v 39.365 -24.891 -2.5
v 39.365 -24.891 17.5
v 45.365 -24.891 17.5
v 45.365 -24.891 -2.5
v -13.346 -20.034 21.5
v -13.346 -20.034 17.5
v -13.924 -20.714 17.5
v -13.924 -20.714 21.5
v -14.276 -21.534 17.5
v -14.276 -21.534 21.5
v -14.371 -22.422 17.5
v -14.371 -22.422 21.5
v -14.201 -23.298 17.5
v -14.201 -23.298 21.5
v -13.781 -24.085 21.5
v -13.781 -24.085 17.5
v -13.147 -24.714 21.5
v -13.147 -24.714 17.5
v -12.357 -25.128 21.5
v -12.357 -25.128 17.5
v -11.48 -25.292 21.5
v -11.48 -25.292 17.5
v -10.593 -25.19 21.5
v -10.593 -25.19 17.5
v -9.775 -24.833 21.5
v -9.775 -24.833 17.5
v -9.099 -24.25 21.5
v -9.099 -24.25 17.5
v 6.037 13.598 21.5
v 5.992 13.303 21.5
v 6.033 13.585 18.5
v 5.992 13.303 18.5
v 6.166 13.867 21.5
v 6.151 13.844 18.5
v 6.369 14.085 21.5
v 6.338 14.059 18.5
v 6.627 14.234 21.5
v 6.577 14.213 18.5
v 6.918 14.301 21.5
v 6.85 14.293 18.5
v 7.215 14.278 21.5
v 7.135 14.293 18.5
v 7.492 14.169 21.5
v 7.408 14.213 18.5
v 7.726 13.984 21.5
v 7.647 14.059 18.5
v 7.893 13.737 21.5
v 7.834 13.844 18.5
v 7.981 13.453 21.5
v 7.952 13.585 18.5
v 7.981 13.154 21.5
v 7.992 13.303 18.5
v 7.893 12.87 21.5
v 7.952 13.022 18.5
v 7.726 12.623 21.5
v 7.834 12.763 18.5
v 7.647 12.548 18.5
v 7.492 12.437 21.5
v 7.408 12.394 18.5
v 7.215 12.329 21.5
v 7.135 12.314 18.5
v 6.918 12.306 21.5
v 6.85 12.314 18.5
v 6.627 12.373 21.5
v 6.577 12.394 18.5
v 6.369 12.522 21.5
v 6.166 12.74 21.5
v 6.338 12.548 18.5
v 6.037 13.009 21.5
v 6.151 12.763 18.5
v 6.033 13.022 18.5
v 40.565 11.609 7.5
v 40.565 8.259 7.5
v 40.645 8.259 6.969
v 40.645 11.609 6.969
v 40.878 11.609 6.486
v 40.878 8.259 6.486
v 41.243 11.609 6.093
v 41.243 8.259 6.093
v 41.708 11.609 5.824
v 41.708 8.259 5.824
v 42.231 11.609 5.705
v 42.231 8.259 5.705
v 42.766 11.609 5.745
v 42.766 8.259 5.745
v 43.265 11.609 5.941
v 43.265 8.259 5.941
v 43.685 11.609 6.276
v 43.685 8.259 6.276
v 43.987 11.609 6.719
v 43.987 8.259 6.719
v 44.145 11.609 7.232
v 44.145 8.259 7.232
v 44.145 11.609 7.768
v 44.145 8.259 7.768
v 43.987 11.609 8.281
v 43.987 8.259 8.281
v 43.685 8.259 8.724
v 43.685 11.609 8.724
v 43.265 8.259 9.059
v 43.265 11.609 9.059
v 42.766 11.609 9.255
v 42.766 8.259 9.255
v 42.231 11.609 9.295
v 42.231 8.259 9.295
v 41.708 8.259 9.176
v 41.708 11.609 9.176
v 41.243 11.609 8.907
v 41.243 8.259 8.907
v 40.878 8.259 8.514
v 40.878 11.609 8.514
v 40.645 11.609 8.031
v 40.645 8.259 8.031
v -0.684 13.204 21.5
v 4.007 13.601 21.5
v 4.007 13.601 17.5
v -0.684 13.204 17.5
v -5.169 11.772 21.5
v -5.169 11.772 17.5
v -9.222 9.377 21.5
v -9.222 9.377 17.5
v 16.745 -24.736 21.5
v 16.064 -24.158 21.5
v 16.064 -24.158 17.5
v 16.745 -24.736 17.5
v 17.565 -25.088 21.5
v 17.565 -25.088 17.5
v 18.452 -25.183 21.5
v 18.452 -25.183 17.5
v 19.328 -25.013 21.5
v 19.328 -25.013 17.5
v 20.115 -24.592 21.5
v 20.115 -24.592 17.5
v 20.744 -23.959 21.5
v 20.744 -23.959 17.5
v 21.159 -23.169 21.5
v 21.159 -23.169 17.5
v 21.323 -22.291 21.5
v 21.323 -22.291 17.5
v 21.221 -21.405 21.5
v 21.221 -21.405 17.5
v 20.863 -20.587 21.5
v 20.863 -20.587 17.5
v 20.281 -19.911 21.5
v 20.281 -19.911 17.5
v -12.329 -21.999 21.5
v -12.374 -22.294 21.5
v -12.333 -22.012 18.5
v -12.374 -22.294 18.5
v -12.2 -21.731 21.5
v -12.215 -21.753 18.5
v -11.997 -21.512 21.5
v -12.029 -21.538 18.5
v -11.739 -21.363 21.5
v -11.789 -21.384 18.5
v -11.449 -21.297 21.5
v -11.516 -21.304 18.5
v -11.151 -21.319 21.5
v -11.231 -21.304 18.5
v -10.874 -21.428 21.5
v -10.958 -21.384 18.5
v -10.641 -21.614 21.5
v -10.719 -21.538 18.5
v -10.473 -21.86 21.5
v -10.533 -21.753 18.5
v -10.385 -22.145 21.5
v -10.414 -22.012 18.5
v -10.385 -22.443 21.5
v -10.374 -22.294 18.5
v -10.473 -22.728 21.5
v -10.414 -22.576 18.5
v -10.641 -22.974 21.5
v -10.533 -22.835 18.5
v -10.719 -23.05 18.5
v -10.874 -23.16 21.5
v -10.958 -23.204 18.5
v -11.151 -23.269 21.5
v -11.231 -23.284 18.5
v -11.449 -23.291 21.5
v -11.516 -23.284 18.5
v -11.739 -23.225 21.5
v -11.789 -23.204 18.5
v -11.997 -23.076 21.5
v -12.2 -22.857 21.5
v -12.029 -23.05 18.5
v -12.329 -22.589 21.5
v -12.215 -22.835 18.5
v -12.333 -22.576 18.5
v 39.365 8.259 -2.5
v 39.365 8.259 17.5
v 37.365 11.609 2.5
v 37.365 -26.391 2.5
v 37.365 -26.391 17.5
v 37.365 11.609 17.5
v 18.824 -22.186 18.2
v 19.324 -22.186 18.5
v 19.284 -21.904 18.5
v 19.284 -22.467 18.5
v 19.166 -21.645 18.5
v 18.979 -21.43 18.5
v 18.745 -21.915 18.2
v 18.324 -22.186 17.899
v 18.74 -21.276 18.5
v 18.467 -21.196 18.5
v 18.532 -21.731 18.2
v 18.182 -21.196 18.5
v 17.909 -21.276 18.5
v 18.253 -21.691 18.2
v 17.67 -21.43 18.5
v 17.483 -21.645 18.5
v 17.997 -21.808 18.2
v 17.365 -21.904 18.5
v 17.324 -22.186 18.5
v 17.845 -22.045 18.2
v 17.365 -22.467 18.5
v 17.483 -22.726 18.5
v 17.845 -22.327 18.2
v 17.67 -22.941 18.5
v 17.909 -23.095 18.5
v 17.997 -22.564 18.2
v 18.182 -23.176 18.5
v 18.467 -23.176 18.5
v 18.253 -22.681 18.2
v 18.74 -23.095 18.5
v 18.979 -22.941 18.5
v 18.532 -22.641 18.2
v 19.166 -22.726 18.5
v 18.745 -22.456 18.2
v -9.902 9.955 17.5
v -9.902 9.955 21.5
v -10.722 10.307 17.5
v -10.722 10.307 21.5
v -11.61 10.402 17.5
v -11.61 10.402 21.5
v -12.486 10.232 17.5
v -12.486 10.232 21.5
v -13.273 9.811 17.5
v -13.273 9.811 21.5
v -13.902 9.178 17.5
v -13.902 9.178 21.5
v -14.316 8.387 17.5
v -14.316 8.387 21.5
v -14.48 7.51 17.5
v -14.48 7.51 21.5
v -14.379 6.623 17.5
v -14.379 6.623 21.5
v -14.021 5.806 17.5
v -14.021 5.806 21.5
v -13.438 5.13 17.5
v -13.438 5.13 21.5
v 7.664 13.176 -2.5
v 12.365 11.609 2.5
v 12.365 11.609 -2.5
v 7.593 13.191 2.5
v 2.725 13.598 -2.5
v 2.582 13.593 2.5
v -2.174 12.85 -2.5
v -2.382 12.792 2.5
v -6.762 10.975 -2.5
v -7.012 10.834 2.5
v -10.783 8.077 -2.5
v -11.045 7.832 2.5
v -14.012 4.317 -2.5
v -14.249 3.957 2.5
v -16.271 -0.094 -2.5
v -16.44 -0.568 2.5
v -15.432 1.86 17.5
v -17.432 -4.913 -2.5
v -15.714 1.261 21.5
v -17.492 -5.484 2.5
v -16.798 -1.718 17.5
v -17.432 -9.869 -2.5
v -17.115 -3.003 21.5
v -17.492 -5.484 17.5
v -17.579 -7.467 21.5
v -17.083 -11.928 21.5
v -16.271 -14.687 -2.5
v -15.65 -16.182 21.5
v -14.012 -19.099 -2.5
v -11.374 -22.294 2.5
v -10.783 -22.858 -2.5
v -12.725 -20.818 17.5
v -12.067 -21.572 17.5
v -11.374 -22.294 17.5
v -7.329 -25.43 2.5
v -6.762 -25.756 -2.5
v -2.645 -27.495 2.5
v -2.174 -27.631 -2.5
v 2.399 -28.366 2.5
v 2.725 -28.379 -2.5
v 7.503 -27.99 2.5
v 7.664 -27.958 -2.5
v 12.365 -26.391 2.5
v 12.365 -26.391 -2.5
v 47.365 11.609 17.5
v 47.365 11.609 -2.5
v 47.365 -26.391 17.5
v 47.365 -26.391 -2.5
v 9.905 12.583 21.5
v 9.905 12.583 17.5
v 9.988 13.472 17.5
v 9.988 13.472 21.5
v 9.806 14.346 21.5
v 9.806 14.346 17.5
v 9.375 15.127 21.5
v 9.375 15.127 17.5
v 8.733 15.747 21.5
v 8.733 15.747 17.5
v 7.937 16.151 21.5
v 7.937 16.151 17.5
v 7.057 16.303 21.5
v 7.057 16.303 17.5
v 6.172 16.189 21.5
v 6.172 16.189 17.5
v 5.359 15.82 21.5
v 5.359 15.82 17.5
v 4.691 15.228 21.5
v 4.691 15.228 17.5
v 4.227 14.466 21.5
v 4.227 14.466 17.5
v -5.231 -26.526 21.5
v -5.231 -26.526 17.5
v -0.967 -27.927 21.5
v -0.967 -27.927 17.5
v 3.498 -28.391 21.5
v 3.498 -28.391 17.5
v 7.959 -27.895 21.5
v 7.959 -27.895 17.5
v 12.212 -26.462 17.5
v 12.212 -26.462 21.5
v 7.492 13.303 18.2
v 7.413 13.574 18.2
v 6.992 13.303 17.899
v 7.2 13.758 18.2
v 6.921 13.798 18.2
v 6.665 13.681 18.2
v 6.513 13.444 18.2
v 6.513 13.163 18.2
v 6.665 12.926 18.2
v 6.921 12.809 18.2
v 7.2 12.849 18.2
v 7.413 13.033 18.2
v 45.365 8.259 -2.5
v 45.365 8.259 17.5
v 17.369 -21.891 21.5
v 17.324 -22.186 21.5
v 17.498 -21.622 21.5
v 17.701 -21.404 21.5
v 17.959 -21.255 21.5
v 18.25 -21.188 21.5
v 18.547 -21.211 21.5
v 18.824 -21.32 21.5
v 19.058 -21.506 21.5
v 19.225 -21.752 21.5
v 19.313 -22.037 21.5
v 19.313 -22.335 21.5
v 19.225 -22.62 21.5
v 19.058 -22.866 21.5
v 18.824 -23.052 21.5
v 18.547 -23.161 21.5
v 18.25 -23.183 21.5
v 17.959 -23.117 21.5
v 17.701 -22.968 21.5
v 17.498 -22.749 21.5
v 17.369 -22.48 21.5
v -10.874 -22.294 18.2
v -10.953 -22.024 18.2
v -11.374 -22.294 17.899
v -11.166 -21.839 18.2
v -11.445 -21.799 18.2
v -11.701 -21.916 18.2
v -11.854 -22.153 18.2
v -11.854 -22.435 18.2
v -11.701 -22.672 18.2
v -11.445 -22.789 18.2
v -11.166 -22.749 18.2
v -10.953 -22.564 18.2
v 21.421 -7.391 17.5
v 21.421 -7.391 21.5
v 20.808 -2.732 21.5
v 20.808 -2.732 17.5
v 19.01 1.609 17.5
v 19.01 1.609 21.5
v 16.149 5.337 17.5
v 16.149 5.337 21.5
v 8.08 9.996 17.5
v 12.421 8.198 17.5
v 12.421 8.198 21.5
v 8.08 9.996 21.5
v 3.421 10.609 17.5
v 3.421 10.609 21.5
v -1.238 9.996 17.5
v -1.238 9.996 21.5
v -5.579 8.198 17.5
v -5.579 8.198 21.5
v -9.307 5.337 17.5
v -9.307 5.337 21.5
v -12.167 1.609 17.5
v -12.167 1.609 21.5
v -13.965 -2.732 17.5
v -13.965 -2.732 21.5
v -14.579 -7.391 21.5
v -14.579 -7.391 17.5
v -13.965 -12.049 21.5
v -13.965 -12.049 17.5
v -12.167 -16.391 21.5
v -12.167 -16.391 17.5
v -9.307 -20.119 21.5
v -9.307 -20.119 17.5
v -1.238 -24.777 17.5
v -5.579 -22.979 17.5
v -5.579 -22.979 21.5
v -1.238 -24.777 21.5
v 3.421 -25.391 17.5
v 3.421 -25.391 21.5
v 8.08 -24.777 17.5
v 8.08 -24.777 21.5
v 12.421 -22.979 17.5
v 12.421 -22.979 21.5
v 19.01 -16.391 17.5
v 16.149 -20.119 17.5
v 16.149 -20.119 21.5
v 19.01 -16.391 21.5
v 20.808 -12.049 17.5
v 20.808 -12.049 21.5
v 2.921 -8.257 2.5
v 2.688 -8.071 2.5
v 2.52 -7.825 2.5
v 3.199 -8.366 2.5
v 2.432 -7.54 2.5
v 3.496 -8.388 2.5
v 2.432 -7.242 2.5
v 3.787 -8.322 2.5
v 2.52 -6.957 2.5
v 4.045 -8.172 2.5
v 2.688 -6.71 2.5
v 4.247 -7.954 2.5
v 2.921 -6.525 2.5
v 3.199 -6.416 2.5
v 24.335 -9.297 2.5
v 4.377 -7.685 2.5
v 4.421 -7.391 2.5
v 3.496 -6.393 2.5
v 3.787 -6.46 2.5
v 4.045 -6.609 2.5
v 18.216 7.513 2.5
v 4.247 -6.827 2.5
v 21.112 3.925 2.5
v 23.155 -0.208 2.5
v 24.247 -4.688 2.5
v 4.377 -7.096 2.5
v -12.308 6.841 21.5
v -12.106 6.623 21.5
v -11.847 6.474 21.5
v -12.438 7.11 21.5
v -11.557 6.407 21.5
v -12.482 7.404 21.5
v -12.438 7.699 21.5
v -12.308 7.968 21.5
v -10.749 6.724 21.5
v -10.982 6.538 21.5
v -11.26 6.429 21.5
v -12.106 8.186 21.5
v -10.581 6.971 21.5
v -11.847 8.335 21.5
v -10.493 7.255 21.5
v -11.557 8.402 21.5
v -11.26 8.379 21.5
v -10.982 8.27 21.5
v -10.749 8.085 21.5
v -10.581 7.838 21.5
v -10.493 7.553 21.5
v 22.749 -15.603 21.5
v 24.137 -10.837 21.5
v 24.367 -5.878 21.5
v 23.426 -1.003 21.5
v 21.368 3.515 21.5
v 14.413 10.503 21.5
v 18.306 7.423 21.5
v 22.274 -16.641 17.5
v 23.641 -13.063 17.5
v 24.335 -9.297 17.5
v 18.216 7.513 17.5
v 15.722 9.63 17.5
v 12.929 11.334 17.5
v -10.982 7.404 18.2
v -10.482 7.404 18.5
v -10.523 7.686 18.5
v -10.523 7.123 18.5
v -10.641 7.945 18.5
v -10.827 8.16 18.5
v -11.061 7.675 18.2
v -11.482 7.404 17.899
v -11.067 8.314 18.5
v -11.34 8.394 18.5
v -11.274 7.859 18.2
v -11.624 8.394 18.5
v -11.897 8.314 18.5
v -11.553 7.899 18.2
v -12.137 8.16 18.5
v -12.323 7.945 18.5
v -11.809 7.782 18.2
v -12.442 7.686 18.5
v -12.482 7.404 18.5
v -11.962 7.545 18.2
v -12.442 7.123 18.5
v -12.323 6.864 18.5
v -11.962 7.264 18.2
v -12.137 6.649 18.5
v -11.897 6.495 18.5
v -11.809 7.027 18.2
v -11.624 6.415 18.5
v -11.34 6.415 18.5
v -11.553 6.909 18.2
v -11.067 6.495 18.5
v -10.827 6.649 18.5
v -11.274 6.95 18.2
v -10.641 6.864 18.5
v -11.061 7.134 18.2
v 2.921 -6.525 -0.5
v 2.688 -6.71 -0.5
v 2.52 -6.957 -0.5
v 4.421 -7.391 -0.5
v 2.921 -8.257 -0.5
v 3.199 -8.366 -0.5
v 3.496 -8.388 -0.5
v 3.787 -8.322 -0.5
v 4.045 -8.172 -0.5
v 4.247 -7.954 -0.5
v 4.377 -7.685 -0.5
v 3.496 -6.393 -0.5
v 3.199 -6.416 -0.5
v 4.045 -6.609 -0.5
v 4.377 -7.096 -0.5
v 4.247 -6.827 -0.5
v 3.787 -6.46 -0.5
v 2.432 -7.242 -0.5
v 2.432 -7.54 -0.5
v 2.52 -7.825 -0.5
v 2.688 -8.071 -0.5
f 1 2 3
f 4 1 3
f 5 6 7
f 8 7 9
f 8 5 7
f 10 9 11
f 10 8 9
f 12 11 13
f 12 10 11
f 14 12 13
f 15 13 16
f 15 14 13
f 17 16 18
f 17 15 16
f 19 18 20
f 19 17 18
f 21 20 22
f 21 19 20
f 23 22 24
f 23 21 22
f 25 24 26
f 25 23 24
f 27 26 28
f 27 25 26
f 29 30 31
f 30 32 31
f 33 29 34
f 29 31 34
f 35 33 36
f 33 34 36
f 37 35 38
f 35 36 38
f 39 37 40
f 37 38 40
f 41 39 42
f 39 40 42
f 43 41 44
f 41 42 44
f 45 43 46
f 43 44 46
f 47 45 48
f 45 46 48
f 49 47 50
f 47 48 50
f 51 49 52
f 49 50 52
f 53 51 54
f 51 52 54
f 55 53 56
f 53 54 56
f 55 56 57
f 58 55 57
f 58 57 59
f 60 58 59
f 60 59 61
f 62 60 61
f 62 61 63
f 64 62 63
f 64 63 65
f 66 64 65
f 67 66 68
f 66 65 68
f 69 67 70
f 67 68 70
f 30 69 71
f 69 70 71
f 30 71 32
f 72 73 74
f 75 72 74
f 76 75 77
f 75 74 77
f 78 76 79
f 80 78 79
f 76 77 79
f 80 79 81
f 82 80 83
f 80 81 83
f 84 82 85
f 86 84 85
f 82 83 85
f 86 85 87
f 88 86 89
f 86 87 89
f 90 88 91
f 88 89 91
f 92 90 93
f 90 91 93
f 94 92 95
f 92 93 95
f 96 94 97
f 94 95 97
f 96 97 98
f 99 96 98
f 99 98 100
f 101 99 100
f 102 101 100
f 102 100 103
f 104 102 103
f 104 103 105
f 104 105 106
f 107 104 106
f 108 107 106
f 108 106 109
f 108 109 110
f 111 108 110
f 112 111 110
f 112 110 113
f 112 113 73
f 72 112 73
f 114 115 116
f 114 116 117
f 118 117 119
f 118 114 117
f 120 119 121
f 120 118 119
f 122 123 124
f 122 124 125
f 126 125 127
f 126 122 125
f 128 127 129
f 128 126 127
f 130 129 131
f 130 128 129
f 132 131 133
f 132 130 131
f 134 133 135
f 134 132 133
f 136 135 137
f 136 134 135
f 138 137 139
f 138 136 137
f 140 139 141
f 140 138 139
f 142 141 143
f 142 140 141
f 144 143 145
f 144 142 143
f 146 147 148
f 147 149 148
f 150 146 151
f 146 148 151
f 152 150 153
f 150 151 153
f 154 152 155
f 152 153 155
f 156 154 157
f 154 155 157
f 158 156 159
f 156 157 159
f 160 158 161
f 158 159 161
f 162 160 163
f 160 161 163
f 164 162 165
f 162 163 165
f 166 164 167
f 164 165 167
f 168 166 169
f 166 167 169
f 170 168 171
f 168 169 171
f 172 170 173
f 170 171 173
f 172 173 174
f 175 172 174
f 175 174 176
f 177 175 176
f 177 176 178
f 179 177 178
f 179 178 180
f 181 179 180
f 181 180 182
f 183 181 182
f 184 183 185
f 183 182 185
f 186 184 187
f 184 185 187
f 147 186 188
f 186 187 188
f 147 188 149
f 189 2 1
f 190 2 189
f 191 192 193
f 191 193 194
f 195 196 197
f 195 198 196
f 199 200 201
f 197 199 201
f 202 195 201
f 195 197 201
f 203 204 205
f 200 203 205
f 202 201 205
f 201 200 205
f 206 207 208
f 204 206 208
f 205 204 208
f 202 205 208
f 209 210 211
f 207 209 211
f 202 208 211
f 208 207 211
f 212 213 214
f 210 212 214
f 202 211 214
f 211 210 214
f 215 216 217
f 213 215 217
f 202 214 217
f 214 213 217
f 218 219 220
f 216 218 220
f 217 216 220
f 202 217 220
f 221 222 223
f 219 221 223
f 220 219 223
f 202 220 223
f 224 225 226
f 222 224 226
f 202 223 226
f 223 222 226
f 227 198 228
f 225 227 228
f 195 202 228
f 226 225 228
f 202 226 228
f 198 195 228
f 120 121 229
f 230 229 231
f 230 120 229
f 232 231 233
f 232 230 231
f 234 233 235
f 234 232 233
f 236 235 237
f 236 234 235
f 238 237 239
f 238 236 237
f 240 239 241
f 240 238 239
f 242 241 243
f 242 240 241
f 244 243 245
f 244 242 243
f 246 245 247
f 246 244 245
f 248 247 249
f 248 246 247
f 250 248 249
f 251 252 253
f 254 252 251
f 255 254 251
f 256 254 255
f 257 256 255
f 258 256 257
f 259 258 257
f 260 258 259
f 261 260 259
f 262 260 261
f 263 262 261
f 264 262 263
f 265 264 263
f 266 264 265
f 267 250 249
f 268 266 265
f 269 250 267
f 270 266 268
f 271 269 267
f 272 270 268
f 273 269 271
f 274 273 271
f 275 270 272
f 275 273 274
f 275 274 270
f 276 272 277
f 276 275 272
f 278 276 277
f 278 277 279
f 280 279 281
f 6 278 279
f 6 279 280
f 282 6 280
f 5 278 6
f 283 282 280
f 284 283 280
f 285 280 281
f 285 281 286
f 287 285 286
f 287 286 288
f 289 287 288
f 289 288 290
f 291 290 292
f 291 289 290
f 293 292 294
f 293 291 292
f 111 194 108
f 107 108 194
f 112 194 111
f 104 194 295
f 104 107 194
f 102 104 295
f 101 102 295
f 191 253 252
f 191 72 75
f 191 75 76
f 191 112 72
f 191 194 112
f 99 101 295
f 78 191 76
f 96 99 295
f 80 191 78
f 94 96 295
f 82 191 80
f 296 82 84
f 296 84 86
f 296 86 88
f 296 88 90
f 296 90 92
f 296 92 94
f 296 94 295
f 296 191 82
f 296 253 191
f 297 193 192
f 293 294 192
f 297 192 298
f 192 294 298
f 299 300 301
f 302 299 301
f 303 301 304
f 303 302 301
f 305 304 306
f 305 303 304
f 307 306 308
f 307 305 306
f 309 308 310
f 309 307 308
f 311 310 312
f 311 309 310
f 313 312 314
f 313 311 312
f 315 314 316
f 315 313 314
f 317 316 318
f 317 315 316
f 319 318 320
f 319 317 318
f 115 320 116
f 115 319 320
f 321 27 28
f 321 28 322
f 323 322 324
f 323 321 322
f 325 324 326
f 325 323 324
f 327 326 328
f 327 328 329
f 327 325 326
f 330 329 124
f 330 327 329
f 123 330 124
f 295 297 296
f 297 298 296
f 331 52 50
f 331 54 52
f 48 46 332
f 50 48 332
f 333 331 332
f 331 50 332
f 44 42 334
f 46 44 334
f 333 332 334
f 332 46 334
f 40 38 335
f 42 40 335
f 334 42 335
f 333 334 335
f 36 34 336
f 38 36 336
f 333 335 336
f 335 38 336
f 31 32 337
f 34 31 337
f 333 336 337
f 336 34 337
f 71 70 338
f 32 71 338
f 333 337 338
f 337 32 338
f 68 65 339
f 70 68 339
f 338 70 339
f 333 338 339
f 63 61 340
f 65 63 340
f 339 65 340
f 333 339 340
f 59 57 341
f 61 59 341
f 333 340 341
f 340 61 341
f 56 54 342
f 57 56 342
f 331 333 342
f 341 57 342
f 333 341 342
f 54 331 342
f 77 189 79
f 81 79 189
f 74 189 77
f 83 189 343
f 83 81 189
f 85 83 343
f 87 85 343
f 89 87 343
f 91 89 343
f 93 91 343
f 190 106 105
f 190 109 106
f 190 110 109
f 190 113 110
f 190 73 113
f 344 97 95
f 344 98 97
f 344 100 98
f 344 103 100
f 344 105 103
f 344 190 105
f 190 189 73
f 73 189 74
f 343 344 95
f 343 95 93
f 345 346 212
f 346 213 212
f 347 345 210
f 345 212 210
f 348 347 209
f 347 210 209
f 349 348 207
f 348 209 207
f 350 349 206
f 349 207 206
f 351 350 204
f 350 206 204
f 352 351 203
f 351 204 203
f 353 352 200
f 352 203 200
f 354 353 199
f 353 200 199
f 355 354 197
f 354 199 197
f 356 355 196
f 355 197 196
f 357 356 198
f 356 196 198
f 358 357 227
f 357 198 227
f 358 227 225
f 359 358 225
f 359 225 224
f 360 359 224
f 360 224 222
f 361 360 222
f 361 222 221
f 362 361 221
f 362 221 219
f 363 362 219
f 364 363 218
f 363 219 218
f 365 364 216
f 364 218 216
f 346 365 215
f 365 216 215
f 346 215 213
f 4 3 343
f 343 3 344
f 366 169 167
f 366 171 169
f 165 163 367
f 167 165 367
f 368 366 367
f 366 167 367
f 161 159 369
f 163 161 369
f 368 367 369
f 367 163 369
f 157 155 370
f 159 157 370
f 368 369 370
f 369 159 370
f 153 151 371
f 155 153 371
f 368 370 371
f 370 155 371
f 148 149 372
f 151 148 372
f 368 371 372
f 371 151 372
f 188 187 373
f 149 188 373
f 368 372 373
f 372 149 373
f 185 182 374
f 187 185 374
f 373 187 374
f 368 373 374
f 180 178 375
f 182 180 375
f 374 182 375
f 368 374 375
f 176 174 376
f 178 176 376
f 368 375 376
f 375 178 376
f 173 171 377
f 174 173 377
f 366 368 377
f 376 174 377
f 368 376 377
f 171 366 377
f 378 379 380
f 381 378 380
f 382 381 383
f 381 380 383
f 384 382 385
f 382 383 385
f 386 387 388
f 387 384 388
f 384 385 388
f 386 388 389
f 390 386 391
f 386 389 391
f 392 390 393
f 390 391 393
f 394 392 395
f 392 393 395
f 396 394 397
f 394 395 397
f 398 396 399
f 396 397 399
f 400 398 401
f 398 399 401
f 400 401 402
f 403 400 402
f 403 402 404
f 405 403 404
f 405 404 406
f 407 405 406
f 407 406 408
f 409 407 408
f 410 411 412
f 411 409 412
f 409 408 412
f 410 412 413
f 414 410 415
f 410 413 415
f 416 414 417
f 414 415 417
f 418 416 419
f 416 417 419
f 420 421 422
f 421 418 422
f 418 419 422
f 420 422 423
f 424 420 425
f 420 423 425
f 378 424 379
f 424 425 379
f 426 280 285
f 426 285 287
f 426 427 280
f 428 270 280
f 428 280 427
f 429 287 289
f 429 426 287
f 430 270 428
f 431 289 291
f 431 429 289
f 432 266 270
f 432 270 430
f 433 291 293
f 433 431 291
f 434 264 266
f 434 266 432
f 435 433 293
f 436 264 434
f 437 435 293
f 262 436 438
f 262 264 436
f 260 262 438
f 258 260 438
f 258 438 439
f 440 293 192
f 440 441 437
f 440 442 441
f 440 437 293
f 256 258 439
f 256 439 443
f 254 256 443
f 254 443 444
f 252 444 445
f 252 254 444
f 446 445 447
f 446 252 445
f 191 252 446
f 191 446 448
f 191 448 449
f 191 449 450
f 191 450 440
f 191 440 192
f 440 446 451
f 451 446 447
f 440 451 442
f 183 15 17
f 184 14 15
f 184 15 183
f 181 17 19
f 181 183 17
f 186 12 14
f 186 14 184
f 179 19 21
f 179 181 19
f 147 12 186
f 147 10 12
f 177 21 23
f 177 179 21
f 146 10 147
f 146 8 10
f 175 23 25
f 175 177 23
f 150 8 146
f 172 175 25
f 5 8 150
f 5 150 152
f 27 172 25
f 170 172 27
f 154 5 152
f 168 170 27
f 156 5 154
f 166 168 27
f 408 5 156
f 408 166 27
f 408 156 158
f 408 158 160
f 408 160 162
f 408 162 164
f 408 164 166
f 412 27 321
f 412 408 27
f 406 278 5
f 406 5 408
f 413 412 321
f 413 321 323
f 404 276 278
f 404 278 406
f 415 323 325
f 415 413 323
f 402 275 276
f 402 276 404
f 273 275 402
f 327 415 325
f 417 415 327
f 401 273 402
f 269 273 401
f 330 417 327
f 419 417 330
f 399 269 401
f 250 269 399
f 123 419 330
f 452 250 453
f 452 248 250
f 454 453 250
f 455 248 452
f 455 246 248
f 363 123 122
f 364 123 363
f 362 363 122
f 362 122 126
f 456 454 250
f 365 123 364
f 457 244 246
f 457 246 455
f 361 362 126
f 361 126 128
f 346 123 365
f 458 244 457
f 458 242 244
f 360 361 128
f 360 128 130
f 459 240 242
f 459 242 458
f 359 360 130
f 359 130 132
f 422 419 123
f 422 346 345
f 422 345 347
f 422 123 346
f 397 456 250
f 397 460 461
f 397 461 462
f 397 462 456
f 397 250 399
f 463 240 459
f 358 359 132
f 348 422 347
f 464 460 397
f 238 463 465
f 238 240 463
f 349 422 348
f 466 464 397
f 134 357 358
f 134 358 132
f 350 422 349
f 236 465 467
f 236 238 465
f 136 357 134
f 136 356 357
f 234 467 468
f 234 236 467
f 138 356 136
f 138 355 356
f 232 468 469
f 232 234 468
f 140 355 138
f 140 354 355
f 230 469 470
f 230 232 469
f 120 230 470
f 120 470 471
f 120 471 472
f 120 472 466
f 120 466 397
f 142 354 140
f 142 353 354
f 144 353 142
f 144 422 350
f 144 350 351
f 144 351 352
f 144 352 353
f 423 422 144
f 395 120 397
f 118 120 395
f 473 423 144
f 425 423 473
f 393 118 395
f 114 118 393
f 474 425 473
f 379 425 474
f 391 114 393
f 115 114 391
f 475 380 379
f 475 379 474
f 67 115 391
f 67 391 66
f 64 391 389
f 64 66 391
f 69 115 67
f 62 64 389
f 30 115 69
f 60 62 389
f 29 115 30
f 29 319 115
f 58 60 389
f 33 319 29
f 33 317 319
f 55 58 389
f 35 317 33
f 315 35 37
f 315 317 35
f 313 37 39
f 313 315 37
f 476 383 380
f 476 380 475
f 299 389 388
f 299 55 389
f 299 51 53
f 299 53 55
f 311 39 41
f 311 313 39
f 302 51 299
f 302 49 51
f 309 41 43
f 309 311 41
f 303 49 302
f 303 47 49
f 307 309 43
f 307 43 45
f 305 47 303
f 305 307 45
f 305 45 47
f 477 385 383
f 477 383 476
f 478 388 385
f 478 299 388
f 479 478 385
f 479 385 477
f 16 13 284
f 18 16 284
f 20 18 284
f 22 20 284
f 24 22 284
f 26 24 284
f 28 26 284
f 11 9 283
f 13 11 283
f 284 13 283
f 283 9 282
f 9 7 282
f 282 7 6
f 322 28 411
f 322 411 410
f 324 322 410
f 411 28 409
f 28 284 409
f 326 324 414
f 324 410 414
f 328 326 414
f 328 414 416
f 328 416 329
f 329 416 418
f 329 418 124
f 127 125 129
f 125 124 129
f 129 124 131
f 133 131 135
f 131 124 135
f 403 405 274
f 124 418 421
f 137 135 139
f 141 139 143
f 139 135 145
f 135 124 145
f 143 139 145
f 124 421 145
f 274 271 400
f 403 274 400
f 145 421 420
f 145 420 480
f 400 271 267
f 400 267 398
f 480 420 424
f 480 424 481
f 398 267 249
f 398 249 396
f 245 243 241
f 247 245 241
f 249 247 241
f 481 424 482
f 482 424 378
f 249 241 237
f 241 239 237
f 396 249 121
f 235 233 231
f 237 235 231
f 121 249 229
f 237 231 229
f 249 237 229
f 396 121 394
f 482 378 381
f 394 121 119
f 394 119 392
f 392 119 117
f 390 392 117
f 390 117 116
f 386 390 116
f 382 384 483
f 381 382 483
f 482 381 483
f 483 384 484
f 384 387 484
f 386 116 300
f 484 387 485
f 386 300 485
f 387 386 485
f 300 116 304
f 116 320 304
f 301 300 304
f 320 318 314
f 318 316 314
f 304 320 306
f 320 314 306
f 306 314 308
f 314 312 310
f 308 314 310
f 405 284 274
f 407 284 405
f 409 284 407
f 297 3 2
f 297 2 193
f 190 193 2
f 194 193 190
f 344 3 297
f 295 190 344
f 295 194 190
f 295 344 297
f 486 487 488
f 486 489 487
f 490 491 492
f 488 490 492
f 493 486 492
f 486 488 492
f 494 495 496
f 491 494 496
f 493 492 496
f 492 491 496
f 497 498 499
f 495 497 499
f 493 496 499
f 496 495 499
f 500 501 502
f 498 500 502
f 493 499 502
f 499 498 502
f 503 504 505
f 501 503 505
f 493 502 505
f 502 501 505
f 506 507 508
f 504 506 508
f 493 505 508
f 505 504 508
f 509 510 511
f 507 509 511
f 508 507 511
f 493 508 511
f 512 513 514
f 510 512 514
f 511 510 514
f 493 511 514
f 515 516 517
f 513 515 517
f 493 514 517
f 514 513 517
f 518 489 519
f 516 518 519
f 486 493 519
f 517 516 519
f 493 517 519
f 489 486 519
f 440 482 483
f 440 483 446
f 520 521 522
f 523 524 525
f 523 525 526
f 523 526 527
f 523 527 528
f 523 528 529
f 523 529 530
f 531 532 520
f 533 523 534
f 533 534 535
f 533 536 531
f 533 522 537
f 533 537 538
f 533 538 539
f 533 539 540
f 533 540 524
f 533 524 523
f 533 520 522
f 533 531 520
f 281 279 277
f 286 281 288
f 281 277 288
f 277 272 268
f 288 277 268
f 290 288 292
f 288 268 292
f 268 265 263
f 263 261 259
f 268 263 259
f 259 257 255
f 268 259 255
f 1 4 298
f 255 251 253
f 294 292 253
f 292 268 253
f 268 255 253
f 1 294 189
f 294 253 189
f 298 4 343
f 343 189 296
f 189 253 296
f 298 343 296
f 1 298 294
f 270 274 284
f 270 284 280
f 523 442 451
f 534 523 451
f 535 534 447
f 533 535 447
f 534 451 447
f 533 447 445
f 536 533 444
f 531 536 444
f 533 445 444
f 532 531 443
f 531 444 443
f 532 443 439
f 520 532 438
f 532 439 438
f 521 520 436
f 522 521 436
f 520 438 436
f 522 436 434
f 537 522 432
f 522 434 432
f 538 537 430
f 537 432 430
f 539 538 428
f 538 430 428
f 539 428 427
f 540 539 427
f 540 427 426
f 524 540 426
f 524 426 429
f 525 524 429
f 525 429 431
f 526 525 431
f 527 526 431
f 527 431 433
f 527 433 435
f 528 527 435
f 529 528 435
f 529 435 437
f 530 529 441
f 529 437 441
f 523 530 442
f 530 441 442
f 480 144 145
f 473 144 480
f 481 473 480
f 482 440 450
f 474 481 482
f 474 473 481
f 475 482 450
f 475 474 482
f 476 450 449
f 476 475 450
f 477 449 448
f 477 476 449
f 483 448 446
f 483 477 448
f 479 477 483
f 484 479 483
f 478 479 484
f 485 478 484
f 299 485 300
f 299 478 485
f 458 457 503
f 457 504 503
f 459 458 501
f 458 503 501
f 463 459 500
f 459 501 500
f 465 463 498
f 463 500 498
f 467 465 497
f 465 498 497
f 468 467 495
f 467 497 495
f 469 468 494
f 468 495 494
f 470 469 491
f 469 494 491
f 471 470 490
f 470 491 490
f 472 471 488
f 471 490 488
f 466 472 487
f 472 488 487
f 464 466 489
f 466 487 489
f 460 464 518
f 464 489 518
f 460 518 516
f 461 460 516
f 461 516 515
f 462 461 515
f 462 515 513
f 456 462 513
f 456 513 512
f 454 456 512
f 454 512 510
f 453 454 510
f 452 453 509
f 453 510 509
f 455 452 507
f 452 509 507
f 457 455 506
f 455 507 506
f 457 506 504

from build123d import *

# Parameters (mm, degrees)
ESTRUSIONE_ESTRUSIONE1_DEPTH = 2.5
SCHIZZO2_W                   = 10
SCHIZZO2_H                   = 38
ESTRUSIONE_ESTRUSIONE2_DEPTH = 15
SCHIZZO3_W                   = 6
SCHIZZO3_H                   = 33.15
TAGLIO_ESTRUSIONE1_DEPTH     = 20
ESTRUSIONE_SOTTILE1_START    = 19
SCHIZZO5_R                   = 21
SCHIZZO5_R_2                 = 18
ESTRUSIONE_SOTTILE1_DEPTH    = 19
SCHIZZO8_W                   = 38
SCHIZZO8_H                   = 15
TAGLIO_ESTRUSIONE2_DEPTH     = 70.157520353
SCHIZZO10_R                  = 3
ESTRUSIONE_ESTRUSIONE3_DEPTH = 4
FORO_PER_VITE_M1_6_1_D       = 2
FORO_PER_VITE_M1_6_1_DEPTH   = 3
FORO_PER_VITE_M1_6_1_TIP     = 0.600860619
SCHIZZO12_R                  = 1
TAGLIO_ESTRUSIONE3_DEPTH     = 3
FORO_PER_VITE_M3_1_D         = 3.6
FORO_PER_VITE_M3_1_DEPTH     = 4
FORO_PER_VITE_M3_1_TIP       = 1.081549114


with BuildPart() as part:
    # Schizzo1 → Estrusione-Estrusione1 (new, symmetric)
    with BuildSketch(Plane.XY):
        with BuildLine():
            Line((12.36549987, -26.390648792), (47.36549987, -26.390648792))
            Line((47.36549987, -26.390648792), (47.36549987, 11.609351208))
            Line((47.36549987, 11.609351208), (12.36549987, 11.609351208))
            ThreePointArc((12.36549987, 11.609351208), (-17.57877204, -7.390648792), (12.36549987, -26.390648792))
        make_face()
    extrude(amount=ESTRUSIONE_ESTRUSIONE1_DEPTH, both=True)

    # Schizzo2 → Estrusione-Estrusione2 (add)
    with BuildSketch(Plane.XY.offset(2.5)):
        with Locations((42.36549987, -7.390648792)):
            Rectangle(SCHIZZO2_W, SCHIZZO2_H)
    extrude(amount=ESTRUSIONE_ESTRUSIONE2_DEPTH)

    # Schizzo3 → Taglio-Estrusione1 (cut)
    with BuildSketch(Plane.XY.offset(17.5)):
        with Locations((42.36549987, -8.315648792)):
            Rectangle(SCHIZZO3_W, SCHIZZO3_H)
    extrude(amount=-TAGLIO_ESTRUSIONE1_DEPTH, mode=Mode.SUBTRACT)

    # Schizzo5 → Estrusione-Sottile1 (add)
    with BuildSketch(Plane.XY.offset(2.5).offset(ESTRUSIONE_SOTTILE1_START)):
        with Locations((3.42122796, -7.390648792)):
            Circle(SCHIZZO5_R)
        with Locations((3.42122796, -7.390648792)):
            Circle(SCHIZZO5_R_2, mode=Mode.SUBTRACT)
    extrude(amount=-ESTRUSIONE_SOTTILE1_DEPTH)

    # Schizzo8 → Taglio-Estrusione2 (cut, through all)
    with BuildSketch(Plane(origin=(-4.406906628, 12.10787645, 0), x_dir=(0.9396926207859102, 0.3420201433256638, 0), z_dir=(-0.3420201433256638, 0.9396926207859102, 0))):
        with Locations((0.687151909, -10)):
            Rectangle(SCHIZZO8_W, SCHIZZO8_H)
    extrude(amount=-TAGLIO_ESTRUSIONE2_DEPTH, mode=Mode.SUBTRACT)

    # Schizzo10 → Estrusione-Estrusione3 (add)
    with BuildSketch(Plane.XY.offset(21.5)):
        with Locations((-11.482021075, 7.404389842)):
            Circle(SCHIZZO10_R)
        with Locations((18.324476995, -22.185687427)):
            Circle(SCHIZZO10_R)
        with Locations((-11.373810674, -22.293897828)):
            Circle(SCHIZZO10_R)
        with Locations((6.992461631, 13.303463657)):
            Circle(SCHIZZO10_R)
    extrude(amount=-ESTRUSIONE_ESTRUSIONE3_DEPTH)

    # Foro per Vite M1.6-1
    with Locations(Plane(origin=(6.992461631, 13.303463657, 21.5), x_dir=(1, 0, 0), z_dir=(0, 0, 1))):
        with Locations((0, 0), (-18.474482706, -5.899073815), (-18.366272305, -35.597361485), (11.332015364, -35.489151084)):
            Hole(FORO_PER_VITE_M1_6_1_D / 2, depth=FORO_PER_VITE_M1_6_1_DEPTH)
            with Locations((0, 0, -(FORO_PER_VITE_M1_6_1_DEPTH + FORO_PER_VITE_M1_6_1_TIP / 2))):  # 118° drill point
                Cone(0, FORO_PER_VITE_M1_6_1_D / 2, FORO_PER_VITE_M1_6_1_TIP, mode=Mode.SUBTRACT)

    # Schizzo12 → Taglio-Estrusione3 (cut)
    with BuildSketch(Plane.XY.offset(2.5)):
        with Locations((3.42122796, -7.390648792)):
            Circle(SCHIZZO12_R)
    extrude(amount=-TAGLIO_ESTRUSIONE3_DEPTH, mode=Mode.SUBTRACT)

    # Foro per Vite M3-1
    with Locations(Plane(origin=(42.36549987, 11.609351208, 7.5), x_dir=(1, 0, 0), z_dir=(0, 1, 0))):
        with Locations((0, 0)):
            Hole(FORO_PER_VITE_M3_1_D / 2, depth=FORO_PER_VITE_M3_1_DEPTH)
            with Locations((0, 0, -(FORO_PER_VITE_M3_1_DEPTH + FORO_PER_VITE_M3_1_TIP / 2))):  # 118° drill point
                Cone(0, FORO_PER_VITE_M3_1_D / 2, FORO_PER_VITE_M3_1_TIP, mode=Mode.SUBTRACT)


solid = part.part
